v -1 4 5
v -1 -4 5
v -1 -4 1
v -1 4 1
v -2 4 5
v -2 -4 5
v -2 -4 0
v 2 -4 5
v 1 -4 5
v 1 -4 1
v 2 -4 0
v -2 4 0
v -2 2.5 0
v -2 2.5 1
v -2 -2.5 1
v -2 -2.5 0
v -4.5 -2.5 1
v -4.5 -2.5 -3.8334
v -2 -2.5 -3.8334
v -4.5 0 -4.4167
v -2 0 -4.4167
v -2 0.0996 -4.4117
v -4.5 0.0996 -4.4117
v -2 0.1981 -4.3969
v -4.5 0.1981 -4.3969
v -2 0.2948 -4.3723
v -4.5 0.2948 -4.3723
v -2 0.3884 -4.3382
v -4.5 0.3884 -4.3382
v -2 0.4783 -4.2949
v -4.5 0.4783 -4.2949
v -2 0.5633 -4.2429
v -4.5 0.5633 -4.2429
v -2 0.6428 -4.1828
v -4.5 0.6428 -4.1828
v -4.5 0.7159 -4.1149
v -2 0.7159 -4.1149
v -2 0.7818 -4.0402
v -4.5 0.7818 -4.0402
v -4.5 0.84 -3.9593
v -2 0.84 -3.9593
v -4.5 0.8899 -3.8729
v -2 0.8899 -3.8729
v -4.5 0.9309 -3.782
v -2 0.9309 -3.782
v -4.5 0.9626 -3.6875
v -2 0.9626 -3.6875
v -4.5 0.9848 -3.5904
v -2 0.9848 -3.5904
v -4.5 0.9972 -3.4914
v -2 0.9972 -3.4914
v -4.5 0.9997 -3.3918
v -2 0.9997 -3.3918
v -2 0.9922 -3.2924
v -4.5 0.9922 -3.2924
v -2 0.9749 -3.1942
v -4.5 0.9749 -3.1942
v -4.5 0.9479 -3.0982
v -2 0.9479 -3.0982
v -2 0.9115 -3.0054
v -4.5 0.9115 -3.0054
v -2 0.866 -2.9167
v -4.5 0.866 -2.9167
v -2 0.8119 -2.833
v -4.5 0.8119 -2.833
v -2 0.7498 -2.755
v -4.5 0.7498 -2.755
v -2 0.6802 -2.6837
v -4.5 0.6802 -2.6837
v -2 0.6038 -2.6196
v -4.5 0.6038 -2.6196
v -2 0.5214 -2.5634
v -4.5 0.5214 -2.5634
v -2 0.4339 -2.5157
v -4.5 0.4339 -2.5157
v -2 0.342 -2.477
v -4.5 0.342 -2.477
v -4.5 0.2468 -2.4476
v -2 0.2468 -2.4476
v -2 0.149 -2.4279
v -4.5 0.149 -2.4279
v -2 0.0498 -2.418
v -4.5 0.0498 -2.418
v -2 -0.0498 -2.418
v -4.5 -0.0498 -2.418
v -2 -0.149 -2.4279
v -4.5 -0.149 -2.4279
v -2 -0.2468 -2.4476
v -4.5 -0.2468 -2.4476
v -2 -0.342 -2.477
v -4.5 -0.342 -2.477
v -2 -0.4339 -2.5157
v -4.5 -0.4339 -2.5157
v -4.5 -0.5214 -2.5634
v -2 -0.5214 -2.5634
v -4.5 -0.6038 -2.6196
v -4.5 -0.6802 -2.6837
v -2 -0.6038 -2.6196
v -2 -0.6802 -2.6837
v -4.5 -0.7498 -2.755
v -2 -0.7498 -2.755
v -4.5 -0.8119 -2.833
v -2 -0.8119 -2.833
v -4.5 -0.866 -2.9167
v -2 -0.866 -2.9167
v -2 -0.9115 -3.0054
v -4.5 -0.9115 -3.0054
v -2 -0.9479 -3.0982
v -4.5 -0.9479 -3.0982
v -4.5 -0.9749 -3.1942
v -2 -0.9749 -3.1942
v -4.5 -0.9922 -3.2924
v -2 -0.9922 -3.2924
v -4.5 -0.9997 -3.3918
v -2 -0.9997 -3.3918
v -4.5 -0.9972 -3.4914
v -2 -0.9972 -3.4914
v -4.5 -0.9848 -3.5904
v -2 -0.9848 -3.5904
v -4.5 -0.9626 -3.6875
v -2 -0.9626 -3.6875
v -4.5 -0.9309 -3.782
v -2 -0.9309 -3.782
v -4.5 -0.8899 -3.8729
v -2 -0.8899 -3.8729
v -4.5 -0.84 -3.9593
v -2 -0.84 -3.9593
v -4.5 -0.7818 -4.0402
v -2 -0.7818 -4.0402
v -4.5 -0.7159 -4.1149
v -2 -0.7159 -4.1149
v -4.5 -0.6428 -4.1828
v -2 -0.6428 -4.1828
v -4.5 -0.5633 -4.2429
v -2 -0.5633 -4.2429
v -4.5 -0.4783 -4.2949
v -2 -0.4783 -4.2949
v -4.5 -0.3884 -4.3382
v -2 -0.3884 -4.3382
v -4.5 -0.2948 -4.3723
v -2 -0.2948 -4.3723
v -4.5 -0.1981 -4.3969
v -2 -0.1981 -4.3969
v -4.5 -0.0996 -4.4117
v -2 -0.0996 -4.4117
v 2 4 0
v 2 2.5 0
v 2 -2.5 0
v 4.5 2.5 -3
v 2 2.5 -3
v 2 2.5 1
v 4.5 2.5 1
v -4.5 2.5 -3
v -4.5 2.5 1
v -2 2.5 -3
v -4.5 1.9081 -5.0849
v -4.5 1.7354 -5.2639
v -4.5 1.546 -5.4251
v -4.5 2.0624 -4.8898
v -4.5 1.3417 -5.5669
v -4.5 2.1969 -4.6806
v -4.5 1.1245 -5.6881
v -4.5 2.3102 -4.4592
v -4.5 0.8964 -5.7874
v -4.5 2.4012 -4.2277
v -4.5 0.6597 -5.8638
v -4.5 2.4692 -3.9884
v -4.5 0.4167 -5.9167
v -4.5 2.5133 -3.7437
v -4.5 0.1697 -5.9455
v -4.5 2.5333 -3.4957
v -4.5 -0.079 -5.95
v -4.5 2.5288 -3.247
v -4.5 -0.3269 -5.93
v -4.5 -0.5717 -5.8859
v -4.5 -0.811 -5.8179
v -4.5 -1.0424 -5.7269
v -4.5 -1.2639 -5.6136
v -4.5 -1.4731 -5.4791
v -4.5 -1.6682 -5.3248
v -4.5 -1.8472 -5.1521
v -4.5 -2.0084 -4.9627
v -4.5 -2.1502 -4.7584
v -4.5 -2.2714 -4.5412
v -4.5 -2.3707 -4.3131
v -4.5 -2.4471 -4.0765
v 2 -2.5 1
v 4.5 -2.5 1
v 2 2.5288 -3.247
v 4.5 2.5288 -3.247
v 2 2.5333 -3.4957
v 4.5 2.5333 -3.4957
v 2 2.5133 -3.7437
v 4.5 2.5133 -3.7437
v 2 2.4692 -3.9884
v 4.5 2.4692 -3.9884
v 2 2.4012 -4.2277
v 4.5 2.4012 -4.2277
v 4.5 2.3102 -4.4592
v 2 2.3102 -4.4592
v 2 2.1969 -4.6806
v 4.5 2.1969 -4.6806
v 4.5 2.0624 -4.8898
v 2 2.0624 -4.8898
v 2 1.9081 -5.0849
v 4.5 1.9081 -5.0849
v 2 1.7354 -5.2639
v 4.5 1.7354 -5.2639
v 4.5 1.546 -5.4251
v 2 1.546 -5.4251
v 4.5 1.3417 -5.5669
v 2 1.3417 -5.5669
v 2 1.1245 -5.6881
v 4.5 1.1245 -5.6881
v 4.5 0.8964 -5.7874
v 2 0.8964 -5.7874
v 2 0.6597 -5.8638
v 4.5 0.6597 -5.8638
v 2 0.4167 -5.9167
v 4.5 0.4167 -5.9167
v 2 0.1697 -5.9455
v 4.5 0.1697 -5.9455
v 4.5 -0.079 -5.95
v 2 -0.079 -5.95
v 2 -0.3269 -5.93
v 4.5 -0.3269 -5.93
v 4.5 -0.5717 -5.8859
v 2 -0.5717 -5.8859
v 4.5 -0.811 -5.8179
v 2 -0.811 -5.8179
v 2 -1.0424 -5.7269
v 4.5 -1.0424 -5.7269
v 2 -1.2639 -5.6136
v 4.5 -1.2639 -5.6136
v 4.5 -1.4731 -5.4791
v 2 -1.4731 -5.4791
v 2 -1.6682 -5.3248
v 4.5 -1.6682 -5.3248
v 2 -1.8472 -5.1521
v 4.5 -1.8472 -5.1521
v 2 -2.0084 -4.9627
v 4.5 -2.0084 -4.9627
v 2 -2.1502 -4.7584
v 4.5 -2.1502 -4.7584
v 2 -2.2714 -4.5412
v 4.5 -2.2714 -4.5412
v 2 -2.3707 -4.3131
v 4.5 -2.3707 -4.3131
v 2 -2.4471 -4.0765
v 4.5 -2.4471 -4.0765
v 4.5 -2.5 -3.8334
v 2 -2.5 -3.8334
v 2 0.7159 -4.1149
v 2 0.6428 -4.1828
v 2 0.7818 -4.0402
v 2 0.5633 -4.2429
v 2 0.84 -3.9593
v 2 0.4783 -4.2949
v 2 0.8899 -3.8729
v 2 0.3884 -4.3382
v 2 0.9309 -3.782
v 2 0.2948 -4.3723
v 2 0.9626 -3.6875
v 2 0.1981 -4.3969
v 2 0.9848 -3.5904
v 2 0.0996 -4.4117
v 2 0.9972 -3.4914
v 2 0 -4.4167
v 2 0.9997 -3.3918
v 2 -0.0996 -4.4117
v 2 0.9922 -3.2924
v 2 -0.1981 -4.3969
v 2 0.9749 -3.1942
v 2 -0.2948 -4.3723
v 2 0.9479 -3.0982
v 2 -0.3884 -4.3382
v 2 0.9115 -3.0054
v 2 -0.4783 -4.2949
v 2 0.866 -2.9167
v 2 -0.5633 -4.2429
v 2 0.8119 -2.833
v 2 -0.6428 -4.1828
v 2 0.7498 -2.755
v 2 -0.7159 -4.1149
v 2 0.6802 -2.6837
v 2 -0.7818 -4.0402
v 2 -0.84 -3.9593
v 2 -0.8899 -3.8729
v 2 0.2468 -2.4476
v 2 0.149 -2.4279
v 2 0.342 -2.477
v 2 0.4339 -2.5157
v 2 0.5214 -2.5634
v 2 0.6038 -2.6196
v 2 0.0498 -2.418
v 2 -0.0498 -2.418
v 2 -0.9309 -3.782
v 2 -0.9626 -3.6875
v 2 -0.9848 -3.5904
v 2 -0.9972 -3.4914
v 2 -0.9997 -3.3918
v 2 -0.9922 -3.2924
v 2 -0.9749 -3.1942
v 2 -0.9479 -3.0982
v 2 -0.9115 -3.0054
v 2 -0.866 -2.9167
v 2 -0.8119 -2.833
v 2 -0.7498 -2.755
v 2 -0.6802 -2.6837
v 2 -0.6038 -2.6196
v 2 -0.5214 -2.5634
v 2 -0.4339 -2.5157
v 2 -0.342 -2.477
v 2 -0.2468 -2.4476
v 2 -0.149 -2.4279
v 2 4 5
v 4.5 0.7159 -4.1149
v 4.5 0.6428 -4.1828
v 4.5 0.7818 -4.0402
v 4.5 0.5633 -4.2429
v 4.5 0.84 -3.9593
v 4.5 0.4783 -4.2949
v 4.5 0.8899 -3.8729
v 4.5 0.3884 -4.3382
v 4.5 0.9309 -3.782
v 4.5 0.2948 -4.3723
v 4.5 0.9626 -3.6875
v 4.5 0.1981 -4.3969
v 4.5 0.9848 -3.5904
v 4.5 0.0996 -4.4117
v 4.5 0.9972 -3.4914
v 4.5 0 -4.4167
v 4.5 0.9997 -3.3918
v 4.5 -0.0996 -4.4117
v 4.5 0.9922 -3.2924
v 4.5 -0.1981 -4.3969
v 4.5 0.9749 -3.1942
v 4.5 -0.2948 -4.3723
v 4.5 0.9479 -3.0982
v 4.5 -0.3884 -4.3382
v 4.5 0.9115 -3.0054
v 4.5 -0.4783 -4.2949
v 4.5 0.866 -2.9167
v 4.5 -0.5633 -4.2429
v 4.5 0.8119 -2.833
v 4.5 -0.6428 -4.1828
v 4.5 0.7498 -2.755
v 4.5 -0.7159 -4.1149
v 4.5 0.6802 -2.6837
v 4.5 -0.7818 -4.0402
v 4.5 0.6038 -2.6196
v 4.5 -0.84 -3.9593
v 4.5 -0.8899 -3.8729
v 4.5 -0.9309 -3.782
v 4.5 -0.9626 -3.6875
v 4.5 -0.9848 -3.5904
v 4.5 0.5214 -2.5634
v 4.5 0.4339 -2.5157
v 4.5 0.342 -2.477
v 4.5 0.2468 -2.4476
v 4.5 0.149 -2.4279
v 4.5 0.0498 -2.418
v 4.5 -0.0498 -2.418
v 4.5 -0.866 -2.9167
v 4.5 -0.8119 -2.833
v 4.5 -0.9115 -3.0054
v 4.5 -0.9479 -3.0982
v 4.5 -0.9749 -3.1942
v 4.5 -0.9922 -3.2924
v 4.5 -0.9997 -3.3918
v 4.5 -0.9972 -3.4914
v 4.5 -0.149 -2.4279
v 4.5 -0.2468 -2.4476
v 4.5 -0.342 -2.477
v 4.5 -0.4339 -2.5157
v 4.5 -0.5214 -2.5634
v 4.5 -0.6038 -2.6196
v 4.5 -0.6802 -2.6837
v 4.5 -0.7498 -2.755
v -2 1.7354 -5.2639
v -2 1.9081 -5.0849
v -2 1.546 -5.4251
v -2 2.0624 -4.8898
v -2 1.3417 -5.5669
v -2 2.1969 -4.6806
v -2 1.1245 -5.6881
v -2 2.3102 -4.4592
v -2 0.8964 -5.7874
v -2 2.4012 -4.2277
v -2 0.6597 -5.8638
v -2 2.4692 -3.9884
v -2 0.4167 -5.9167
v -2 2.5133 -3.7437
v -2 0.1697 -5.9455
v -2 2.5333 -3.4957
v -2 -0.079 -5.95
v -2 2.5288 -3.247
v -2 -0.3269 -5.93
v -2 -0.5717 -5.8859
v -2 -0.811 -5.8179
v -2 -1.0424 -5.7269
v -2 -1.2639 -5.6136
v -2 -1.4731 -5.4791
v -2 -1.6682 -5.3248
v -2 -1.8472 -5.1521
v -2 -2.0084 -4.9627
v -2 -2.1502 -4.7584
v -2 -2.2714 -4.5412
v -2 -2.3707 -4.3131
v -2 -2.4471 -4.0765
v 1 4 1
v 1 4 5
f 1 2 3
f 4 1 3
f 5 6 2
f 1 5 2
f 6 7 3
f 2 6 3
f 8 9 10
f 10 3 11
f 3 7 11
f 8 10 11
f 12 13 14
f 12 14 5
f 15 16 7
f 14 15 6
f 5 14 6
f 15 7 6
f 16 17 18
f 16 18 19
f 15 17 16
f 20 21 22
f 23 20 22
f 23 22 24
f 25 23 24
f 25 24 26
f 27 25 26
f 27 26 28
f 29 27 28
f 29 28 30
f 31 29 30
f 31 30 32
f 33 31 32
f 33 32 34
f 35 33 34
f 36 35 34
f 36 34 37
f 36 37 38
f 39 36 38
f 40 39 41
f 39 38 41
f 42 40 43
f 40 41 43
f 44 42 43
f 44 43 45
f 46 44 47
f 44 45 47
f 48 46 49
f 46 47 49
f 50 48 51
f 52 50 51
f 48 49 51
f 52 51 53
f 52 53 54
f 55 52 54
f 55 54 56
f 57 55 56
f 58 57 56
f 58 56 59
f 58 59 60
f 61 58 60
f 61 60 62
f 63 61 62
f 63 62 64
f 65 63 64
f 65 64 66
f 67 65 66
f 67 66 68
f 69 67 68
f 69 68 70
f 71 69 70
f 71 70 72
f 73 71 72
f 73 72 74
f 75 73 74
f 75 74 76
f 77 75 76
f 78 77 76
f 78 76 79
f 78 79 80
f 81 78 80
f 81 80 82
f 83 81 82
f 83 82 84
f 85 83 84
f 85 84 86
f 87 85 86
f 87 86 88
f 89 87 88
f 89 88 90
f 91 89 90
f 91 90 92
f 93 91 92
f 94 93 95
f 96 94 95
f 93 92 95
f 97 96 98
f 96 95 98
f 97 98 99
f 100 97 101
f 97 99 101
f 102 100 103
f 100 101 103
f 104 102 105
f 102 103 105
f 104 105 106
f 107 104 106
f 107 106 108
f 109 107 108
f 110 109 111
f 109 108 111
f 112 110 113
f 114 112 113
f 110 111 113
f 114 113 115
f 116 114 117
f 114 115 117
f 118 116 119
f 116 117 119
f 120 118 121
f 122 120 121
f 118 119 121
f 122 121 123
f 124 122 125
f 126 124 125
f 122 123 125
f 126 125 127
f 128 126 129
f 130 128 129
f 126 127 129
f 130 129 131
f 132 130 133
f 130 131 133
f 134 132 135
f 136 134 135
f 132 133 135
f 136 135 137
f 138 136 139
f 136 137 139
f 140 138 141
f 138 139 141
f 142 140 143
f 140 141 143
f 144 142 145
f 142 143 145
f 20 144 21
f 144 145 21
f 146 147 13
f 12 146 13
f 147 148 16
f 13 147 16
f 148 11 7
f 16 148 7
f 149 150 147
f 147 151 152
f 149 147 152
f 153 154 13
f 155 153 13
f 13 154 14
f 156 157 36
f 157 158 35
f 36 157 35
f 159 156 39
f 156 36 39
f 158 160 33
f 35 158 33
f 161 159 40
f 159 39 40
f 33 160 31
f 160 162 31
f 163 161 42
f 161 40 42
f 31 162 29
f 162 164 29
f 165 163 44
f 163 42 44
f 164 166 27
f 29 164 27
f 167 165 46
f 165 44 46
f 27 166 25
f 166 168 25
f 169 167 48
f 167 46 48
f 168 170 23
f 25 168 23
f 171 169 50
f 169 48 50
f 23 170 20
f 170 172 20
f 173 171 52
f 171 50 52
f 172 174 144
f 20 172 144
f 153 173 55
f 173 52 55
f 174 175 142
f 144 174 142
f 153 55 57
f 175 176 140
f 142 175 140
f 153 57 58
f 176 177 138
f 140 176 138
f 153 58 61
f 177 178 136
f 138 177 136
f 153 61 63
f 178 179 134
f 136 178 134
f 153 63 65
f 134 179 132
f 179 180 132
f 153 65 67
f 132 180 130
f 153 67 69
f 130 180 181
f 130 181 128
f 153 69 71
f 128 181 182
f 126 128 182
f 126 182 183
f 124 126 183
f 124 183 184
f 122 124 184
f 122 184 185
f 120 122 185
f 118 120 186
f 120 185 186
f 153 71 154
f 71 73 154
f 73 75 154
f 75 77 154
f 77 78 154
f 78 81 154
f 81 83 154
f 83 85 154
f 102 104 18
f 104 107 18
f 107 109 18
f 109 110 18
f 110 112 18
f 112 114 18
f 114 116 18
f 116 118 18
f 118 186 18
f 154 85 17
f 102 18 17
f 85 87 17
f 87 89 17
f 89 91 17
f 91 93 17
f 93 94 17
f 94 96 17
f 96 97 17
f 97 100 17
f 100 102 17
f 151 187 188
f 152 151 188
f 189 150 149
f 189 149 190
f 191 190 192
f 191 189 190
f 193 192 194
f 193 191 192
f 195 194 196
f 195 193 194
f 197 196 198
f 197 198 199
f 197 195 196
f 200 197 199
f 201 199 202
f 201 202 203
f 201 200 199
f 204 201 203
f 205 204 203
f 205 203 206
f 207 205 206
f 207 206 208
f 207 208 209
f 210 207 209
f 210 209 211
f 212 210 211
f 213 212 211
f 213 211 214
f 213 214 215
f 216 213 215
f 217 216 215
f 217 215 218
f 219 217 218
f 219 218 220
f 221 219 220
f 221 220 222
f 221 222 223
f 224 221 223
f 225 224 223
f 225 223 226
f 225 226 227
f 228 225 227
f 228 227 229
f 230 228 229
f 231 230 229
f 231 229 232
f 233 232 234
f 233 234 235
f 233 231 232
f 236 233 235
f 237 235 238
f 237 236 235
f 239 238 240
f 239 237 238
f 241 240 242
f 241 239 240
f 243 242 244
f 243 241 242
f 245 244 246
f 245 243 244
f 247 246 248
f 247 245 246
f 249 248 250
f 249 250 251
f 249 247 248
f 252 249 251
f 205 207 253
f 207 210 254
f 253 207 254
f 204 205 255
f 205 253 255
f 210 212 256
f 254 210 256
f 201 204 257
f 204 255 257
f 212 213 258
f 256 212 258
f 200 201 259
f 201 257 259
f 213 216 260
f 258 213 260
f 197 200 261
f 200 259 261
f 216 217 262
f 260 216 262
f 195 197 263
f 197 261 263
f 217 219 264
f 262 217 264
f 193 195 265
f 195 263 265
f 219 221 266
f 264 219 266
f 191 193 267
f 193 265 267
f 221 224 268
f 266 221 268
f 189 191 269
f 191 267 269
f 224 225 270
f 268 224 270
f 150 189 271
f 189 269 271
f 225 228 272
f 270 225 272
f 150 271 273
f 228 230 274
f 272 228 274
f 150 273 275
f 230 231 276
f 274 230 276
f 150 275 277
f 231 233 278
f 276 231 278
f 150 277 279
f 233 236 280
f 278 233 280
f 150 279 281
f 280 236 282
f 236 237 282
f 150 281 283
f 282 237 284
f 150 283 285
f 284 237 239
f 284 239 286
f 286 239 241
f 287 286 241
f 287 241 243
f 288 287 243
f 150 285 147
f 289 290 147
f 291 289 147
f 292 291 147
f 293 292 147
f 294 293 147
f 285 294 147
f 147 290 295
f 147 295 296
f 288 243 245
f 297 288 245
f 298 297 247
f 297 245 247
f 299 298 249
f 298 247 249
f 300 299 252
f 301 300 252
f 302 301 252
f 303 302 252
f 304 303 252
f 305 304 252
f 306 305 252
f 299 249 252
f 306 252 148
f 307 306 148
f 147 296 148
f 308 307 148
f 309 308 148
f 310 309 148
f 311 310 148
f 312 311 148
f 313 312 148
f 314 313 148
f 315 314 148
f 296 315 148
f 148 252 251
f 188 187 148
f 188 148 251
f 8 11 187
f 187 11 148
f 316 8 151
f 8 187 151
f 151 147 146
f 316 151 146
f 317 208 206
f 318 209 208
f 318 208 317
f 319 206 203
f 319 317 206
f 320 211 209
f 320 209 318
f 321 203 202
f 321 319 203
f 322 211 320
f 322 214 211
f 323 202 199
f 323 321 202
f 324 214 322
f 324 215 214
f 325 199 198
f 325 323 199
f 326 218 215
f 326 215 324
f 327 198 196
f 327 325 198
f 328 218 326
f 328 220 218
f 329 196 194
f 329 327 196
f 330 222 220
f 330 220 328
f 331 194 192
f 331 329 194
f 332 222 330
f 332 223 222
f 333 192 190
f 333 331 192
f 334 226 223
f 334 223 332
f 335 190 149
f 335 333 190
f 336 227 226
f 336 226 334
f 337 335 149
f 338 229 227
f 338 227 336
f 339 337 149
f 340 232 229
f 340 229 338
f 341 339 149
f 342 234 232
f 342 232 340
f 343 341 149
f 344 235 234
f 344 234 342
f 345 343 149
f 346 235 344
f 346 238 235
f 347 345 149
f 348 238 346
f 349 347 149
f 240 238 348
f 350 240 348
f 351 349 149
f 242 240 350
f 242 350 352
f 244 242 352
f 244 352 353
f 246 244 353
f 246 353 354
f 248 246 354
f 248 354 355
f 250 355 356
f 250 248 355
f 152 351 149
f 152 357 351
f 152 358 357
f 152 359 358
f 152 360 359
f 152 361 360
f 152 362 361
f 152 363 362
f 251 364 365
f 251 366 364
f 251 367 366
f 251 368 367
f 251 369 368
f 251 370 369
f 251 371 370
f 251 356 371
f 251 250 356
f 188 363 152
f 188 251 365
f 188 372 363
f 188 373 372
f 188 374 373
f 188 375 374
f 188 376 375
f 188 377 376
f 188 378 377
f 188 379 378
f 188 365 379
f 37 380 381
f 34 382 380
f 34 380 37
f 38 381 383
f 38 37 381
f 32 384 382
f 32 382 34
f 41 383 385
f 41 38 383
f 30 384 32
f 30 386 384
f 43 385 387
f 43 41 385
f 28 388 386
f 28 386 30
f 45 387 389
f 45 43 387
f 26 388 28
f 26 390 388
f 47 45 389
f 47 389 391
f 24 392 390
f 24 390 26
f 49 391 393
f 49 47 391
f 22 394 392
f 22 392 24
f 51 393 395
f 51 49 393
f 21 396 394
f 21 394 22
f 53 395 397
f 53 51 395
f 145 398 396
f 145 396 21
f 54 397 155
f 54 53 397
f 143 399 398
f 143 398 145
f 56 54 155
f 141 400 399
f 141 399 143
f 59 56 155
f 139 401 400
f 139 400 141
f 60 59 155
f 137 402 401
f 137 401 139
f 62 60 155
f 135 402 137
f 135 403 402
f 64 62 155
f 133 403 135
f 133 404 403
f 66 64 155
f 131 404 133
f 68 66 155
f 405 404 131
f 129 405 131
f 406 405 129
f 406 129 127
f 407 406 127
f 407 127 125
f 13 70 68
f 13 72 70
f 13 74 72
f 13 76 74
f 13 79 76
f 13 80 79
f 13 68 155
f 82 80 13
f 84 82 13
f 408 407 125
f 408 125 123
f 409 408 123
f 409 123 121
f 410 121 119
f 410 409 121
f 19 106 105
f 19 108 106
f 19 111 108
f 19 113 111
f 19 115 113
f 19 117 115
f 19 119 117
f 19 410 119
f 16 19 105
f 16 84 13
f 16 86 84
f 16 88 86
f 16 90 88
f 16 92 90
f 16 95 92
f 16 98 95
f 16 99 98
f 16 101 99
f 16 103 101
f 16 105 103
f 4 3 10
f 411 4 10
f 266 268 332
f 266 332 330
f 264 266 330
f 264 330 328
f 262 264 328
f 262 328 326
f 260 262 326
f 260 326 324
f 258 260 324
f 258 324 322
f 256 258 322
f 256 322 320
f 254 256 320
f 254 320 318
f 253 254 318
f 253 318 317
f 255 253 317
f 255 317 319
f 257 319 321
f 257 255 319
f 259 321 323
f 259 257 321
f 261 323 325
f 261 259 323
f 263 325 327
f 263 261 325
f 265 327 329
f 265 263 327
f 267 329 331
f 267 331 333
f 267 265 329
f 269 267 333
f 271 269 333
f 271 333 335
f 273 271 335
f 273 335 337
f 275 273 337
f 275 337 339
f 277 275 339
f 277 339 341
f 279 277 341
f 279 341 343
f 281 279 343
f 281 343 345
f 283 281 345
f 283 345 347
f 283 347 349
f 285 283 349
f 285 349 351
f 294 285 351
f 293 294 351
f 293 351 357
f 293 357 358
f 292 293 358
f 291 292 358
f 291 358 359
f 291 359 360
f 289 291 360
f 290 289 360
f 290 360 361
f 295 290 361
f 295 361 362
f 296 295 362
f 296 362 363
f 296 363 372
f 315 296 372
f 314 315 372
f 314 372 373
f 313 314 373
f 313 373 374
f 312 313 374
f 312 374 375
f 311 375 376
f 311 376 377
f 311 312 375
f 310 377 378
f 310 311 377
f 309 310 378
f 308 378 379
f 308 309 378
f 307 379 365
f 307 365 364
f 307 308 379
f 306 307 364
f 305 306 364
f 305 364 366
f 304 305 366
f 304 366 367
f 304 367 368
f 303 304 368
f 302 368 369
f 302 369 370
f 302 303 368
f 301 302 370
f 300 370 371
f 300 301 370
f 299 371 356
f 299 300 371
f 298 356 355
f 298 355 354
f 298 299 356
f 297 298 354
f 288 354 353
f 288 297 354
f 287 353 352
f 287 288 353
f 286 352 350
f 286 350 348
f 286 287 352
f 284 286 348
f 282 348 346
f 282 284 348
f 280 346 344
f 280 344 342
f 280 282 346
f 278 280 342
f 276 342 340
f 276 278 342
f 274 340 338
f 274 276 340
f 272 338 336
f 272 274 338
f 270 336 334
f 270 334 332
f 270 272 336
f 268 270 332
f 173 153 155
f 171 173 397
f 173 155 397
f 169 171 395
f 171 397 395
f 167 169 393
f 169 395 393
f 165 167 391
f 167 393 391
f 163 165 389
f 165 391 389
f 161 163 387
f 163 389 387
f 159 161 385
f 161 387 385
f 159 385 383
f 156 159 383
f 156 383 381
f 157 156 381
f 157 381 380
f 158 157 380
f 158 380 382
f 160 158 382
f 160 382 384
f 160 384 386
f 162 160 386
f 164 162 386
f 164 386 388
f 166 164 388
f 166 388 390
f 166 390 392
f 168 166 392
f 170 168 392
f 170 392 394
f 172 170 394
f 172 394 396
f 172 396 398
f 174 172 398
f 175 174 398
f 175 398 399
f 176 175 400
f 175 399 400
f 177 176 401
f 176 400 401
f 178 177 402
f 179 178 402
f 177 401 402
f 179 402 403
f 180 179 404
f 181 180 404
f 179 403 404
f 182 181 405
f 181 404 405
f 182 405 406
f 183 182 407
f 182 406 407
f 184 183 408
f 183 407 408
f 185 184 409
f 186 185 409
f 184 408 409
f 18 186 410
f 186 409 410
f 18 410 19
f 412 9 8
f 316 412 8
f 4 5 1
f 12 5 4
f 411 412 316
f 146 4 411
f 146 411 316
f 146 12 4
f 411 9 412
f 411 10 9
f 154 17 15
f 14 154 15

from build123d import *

# Parameters (mm, degrees)
SKETCH1_W                = 4
SKETCH1_H                = 5
BOSS_EXTRUDE1_DEPTH      = 3
SKETCH2_W                = 2
SKETCH2_H                = 5
CUT_EXTRUDE1_DEPTH       = 2
BOSS_EXTRUDE2_START      = -1
SKETCH3_R                = 1
BOSS_EXTRUDE2_DEPTH      = 3.5
SKETCH4_W                = 4
SKETCH4_H                = 5.951198117
CUT_EXTRUDE2_DEPTH       = 10.00071436
SKETCH5_W                = 9
SKETCH5_H                = 1
BOSS_EXTRUDE3_DEPTH      = 5
BOSS_EXTRUDE4_DEPTH      = 1.5
BOSS_EXTRUDE4_DEPTH_BACK = 6.5
SKETCH7_W                = 1
SKETCH7_H                = 8
BOSS_EXTRUDE5_DEPTH      = 2


with BuildPart() as part:
    # Sketch1 → Boss-Extrude1 (new body)
    with BuildSketch(Plane.XY):
        Rectangle(SKETCH1_W, SKETCH1_H)
    extrude(amount=BOSS_EXTRUDE1_DEPTH)

    # Sketch2 → Cut-Extrude1 (cut)
    with BuildSketch(Plane.XY.offset(3)):
        Rectangle(SKETCH2_W, SKETCH2_H)
    extrude(amount=-CUT_EXTRUDE1_DEPTH, mode=Mode.SUBTRACT)

    # Sketch3 → Boss-Extrude2 (add)
    with BuildSketch(Plane(origin=(2, 0, 0), x_dir=(0, 0, -1), z_dir=(1, 0, 0)).offset(BOSS_EXTRUDE2_START)):
        with BuildLine():
            Line((0, 2.5), (3, 2.5))
            ThreePointArc((3, 2.5), (5.916707084, 0.416707084), (3.833414169, -2.5))
            Line((3.833414169, -2.5), (0, -2.5))
            Line((0, -2.5), (0, 2.5))
        make_face()
        with Locations((3.416707084, 0)):
            Circle(SKETCH3_R, mode=Mode.SUBTRACT)
    boss_extrude2 = extrude(amount=BOSS_EXTRUDE2_DEPTH)

    # Mirror1: Boss-Extrude2 across plane
    add(boss_extrude2.mirror(Plane(origin=(0, 0, 0), x_dir=(0, 0, 1), z_dir=(1, 0, 0))))

    # Sketch4 → Cut-Extrude2 (cut, through all)
    with BuildSketch(Plane.XZ.offset(2.5)):
        with Locations((0, -2.975599059)):
            Rectangle(SKETCH4_W, SKETCH4_H)
    extrude(amount=-CUT_EXTRUDE2_DEPTH, mode=Mode.SUBTRACT)


with BuildPart() as cut_extrude2_piece_1:
    # of the separate pieces the step leaves, piece 1, a body of its own (cut_extrude2_pieces)
    add(part.part.solids().sort_by_distance((4.5, 2.5, 0))[0])



with BuildPart() as cut_extrude2_piece_2:
    # of the separate pieces the step leaves, piece 2, a body of its own (cut_extrude2_pieces)
    add(part.part.solids().sort_by_distance((-2, 2.5, -3))[0])


with BuildPart() as cut_extrude2_piece_3:
    # of the separate pieces the step leaves, piece 3, a body of its own (cut_extrude2_pieces)
    add(part.part.solids().sort_by_distance((-2, 2.5, 3))[0])


with BuildPart() as cut_extrude2_piece_1_1:
    add(cut_extrude2_piece_1.part)

    add(cut_extrude2_piece_2.part)  # Boss-Extrude3 merges Cut-Extrude2 piece 2

    add(cut_extrude2_piece_3.part)  # Boss-Extrude3 merges Cut-Extrude2 piece 3
    # Sketch5 → Boss-Extrude3 (add)
    with BuildSketch(Plane.XZ.offset(2.5)):
        with Locations((0, 0.5)):
            Rectangle(SKETCH5_W, SKETCH5_H)
    extrude(amount=-BOSS_EXTRUDE3_DEPTH)

    # Sketch6 → Boss-Extrude4 (add, two sides: drawn at the far end of the back side and taken through both)
    with BuildSketch(Plane(origin=(0, 2.5, 0), x_dir=(1, 0, 0), z_dir=(0, 1, 0)).offset(-BOSS_EXTRUDE4_DEPTH_BACK)):
        Polygon((-1, -3), (-1, -1), (1, -1), (1, -3), (2, -3), (2, 0), (-2, 0), (-2, -3), align=None)
    extrude(amount=BOSS_EXTRUDE4_DEPTH + BOSS_EXTRUDE4_DEPTH_BACK)

    # Sketch7 → Boss-Extrude5 (add)
    with BuildSketch(Plane.XY.offset(3)):
        with Locations((1.5, 0)):
            Rectangle(SKETCH7_W, SKETCH7_H)
        with Locations((-1.5, 0)):
            Rectangle(SKETCH7_W, SKETCH7_H)
    extrude(amount=BOSS_EXTRUDE5_DEPTH)


solid = cut_extrude2_piece_1_1.part
